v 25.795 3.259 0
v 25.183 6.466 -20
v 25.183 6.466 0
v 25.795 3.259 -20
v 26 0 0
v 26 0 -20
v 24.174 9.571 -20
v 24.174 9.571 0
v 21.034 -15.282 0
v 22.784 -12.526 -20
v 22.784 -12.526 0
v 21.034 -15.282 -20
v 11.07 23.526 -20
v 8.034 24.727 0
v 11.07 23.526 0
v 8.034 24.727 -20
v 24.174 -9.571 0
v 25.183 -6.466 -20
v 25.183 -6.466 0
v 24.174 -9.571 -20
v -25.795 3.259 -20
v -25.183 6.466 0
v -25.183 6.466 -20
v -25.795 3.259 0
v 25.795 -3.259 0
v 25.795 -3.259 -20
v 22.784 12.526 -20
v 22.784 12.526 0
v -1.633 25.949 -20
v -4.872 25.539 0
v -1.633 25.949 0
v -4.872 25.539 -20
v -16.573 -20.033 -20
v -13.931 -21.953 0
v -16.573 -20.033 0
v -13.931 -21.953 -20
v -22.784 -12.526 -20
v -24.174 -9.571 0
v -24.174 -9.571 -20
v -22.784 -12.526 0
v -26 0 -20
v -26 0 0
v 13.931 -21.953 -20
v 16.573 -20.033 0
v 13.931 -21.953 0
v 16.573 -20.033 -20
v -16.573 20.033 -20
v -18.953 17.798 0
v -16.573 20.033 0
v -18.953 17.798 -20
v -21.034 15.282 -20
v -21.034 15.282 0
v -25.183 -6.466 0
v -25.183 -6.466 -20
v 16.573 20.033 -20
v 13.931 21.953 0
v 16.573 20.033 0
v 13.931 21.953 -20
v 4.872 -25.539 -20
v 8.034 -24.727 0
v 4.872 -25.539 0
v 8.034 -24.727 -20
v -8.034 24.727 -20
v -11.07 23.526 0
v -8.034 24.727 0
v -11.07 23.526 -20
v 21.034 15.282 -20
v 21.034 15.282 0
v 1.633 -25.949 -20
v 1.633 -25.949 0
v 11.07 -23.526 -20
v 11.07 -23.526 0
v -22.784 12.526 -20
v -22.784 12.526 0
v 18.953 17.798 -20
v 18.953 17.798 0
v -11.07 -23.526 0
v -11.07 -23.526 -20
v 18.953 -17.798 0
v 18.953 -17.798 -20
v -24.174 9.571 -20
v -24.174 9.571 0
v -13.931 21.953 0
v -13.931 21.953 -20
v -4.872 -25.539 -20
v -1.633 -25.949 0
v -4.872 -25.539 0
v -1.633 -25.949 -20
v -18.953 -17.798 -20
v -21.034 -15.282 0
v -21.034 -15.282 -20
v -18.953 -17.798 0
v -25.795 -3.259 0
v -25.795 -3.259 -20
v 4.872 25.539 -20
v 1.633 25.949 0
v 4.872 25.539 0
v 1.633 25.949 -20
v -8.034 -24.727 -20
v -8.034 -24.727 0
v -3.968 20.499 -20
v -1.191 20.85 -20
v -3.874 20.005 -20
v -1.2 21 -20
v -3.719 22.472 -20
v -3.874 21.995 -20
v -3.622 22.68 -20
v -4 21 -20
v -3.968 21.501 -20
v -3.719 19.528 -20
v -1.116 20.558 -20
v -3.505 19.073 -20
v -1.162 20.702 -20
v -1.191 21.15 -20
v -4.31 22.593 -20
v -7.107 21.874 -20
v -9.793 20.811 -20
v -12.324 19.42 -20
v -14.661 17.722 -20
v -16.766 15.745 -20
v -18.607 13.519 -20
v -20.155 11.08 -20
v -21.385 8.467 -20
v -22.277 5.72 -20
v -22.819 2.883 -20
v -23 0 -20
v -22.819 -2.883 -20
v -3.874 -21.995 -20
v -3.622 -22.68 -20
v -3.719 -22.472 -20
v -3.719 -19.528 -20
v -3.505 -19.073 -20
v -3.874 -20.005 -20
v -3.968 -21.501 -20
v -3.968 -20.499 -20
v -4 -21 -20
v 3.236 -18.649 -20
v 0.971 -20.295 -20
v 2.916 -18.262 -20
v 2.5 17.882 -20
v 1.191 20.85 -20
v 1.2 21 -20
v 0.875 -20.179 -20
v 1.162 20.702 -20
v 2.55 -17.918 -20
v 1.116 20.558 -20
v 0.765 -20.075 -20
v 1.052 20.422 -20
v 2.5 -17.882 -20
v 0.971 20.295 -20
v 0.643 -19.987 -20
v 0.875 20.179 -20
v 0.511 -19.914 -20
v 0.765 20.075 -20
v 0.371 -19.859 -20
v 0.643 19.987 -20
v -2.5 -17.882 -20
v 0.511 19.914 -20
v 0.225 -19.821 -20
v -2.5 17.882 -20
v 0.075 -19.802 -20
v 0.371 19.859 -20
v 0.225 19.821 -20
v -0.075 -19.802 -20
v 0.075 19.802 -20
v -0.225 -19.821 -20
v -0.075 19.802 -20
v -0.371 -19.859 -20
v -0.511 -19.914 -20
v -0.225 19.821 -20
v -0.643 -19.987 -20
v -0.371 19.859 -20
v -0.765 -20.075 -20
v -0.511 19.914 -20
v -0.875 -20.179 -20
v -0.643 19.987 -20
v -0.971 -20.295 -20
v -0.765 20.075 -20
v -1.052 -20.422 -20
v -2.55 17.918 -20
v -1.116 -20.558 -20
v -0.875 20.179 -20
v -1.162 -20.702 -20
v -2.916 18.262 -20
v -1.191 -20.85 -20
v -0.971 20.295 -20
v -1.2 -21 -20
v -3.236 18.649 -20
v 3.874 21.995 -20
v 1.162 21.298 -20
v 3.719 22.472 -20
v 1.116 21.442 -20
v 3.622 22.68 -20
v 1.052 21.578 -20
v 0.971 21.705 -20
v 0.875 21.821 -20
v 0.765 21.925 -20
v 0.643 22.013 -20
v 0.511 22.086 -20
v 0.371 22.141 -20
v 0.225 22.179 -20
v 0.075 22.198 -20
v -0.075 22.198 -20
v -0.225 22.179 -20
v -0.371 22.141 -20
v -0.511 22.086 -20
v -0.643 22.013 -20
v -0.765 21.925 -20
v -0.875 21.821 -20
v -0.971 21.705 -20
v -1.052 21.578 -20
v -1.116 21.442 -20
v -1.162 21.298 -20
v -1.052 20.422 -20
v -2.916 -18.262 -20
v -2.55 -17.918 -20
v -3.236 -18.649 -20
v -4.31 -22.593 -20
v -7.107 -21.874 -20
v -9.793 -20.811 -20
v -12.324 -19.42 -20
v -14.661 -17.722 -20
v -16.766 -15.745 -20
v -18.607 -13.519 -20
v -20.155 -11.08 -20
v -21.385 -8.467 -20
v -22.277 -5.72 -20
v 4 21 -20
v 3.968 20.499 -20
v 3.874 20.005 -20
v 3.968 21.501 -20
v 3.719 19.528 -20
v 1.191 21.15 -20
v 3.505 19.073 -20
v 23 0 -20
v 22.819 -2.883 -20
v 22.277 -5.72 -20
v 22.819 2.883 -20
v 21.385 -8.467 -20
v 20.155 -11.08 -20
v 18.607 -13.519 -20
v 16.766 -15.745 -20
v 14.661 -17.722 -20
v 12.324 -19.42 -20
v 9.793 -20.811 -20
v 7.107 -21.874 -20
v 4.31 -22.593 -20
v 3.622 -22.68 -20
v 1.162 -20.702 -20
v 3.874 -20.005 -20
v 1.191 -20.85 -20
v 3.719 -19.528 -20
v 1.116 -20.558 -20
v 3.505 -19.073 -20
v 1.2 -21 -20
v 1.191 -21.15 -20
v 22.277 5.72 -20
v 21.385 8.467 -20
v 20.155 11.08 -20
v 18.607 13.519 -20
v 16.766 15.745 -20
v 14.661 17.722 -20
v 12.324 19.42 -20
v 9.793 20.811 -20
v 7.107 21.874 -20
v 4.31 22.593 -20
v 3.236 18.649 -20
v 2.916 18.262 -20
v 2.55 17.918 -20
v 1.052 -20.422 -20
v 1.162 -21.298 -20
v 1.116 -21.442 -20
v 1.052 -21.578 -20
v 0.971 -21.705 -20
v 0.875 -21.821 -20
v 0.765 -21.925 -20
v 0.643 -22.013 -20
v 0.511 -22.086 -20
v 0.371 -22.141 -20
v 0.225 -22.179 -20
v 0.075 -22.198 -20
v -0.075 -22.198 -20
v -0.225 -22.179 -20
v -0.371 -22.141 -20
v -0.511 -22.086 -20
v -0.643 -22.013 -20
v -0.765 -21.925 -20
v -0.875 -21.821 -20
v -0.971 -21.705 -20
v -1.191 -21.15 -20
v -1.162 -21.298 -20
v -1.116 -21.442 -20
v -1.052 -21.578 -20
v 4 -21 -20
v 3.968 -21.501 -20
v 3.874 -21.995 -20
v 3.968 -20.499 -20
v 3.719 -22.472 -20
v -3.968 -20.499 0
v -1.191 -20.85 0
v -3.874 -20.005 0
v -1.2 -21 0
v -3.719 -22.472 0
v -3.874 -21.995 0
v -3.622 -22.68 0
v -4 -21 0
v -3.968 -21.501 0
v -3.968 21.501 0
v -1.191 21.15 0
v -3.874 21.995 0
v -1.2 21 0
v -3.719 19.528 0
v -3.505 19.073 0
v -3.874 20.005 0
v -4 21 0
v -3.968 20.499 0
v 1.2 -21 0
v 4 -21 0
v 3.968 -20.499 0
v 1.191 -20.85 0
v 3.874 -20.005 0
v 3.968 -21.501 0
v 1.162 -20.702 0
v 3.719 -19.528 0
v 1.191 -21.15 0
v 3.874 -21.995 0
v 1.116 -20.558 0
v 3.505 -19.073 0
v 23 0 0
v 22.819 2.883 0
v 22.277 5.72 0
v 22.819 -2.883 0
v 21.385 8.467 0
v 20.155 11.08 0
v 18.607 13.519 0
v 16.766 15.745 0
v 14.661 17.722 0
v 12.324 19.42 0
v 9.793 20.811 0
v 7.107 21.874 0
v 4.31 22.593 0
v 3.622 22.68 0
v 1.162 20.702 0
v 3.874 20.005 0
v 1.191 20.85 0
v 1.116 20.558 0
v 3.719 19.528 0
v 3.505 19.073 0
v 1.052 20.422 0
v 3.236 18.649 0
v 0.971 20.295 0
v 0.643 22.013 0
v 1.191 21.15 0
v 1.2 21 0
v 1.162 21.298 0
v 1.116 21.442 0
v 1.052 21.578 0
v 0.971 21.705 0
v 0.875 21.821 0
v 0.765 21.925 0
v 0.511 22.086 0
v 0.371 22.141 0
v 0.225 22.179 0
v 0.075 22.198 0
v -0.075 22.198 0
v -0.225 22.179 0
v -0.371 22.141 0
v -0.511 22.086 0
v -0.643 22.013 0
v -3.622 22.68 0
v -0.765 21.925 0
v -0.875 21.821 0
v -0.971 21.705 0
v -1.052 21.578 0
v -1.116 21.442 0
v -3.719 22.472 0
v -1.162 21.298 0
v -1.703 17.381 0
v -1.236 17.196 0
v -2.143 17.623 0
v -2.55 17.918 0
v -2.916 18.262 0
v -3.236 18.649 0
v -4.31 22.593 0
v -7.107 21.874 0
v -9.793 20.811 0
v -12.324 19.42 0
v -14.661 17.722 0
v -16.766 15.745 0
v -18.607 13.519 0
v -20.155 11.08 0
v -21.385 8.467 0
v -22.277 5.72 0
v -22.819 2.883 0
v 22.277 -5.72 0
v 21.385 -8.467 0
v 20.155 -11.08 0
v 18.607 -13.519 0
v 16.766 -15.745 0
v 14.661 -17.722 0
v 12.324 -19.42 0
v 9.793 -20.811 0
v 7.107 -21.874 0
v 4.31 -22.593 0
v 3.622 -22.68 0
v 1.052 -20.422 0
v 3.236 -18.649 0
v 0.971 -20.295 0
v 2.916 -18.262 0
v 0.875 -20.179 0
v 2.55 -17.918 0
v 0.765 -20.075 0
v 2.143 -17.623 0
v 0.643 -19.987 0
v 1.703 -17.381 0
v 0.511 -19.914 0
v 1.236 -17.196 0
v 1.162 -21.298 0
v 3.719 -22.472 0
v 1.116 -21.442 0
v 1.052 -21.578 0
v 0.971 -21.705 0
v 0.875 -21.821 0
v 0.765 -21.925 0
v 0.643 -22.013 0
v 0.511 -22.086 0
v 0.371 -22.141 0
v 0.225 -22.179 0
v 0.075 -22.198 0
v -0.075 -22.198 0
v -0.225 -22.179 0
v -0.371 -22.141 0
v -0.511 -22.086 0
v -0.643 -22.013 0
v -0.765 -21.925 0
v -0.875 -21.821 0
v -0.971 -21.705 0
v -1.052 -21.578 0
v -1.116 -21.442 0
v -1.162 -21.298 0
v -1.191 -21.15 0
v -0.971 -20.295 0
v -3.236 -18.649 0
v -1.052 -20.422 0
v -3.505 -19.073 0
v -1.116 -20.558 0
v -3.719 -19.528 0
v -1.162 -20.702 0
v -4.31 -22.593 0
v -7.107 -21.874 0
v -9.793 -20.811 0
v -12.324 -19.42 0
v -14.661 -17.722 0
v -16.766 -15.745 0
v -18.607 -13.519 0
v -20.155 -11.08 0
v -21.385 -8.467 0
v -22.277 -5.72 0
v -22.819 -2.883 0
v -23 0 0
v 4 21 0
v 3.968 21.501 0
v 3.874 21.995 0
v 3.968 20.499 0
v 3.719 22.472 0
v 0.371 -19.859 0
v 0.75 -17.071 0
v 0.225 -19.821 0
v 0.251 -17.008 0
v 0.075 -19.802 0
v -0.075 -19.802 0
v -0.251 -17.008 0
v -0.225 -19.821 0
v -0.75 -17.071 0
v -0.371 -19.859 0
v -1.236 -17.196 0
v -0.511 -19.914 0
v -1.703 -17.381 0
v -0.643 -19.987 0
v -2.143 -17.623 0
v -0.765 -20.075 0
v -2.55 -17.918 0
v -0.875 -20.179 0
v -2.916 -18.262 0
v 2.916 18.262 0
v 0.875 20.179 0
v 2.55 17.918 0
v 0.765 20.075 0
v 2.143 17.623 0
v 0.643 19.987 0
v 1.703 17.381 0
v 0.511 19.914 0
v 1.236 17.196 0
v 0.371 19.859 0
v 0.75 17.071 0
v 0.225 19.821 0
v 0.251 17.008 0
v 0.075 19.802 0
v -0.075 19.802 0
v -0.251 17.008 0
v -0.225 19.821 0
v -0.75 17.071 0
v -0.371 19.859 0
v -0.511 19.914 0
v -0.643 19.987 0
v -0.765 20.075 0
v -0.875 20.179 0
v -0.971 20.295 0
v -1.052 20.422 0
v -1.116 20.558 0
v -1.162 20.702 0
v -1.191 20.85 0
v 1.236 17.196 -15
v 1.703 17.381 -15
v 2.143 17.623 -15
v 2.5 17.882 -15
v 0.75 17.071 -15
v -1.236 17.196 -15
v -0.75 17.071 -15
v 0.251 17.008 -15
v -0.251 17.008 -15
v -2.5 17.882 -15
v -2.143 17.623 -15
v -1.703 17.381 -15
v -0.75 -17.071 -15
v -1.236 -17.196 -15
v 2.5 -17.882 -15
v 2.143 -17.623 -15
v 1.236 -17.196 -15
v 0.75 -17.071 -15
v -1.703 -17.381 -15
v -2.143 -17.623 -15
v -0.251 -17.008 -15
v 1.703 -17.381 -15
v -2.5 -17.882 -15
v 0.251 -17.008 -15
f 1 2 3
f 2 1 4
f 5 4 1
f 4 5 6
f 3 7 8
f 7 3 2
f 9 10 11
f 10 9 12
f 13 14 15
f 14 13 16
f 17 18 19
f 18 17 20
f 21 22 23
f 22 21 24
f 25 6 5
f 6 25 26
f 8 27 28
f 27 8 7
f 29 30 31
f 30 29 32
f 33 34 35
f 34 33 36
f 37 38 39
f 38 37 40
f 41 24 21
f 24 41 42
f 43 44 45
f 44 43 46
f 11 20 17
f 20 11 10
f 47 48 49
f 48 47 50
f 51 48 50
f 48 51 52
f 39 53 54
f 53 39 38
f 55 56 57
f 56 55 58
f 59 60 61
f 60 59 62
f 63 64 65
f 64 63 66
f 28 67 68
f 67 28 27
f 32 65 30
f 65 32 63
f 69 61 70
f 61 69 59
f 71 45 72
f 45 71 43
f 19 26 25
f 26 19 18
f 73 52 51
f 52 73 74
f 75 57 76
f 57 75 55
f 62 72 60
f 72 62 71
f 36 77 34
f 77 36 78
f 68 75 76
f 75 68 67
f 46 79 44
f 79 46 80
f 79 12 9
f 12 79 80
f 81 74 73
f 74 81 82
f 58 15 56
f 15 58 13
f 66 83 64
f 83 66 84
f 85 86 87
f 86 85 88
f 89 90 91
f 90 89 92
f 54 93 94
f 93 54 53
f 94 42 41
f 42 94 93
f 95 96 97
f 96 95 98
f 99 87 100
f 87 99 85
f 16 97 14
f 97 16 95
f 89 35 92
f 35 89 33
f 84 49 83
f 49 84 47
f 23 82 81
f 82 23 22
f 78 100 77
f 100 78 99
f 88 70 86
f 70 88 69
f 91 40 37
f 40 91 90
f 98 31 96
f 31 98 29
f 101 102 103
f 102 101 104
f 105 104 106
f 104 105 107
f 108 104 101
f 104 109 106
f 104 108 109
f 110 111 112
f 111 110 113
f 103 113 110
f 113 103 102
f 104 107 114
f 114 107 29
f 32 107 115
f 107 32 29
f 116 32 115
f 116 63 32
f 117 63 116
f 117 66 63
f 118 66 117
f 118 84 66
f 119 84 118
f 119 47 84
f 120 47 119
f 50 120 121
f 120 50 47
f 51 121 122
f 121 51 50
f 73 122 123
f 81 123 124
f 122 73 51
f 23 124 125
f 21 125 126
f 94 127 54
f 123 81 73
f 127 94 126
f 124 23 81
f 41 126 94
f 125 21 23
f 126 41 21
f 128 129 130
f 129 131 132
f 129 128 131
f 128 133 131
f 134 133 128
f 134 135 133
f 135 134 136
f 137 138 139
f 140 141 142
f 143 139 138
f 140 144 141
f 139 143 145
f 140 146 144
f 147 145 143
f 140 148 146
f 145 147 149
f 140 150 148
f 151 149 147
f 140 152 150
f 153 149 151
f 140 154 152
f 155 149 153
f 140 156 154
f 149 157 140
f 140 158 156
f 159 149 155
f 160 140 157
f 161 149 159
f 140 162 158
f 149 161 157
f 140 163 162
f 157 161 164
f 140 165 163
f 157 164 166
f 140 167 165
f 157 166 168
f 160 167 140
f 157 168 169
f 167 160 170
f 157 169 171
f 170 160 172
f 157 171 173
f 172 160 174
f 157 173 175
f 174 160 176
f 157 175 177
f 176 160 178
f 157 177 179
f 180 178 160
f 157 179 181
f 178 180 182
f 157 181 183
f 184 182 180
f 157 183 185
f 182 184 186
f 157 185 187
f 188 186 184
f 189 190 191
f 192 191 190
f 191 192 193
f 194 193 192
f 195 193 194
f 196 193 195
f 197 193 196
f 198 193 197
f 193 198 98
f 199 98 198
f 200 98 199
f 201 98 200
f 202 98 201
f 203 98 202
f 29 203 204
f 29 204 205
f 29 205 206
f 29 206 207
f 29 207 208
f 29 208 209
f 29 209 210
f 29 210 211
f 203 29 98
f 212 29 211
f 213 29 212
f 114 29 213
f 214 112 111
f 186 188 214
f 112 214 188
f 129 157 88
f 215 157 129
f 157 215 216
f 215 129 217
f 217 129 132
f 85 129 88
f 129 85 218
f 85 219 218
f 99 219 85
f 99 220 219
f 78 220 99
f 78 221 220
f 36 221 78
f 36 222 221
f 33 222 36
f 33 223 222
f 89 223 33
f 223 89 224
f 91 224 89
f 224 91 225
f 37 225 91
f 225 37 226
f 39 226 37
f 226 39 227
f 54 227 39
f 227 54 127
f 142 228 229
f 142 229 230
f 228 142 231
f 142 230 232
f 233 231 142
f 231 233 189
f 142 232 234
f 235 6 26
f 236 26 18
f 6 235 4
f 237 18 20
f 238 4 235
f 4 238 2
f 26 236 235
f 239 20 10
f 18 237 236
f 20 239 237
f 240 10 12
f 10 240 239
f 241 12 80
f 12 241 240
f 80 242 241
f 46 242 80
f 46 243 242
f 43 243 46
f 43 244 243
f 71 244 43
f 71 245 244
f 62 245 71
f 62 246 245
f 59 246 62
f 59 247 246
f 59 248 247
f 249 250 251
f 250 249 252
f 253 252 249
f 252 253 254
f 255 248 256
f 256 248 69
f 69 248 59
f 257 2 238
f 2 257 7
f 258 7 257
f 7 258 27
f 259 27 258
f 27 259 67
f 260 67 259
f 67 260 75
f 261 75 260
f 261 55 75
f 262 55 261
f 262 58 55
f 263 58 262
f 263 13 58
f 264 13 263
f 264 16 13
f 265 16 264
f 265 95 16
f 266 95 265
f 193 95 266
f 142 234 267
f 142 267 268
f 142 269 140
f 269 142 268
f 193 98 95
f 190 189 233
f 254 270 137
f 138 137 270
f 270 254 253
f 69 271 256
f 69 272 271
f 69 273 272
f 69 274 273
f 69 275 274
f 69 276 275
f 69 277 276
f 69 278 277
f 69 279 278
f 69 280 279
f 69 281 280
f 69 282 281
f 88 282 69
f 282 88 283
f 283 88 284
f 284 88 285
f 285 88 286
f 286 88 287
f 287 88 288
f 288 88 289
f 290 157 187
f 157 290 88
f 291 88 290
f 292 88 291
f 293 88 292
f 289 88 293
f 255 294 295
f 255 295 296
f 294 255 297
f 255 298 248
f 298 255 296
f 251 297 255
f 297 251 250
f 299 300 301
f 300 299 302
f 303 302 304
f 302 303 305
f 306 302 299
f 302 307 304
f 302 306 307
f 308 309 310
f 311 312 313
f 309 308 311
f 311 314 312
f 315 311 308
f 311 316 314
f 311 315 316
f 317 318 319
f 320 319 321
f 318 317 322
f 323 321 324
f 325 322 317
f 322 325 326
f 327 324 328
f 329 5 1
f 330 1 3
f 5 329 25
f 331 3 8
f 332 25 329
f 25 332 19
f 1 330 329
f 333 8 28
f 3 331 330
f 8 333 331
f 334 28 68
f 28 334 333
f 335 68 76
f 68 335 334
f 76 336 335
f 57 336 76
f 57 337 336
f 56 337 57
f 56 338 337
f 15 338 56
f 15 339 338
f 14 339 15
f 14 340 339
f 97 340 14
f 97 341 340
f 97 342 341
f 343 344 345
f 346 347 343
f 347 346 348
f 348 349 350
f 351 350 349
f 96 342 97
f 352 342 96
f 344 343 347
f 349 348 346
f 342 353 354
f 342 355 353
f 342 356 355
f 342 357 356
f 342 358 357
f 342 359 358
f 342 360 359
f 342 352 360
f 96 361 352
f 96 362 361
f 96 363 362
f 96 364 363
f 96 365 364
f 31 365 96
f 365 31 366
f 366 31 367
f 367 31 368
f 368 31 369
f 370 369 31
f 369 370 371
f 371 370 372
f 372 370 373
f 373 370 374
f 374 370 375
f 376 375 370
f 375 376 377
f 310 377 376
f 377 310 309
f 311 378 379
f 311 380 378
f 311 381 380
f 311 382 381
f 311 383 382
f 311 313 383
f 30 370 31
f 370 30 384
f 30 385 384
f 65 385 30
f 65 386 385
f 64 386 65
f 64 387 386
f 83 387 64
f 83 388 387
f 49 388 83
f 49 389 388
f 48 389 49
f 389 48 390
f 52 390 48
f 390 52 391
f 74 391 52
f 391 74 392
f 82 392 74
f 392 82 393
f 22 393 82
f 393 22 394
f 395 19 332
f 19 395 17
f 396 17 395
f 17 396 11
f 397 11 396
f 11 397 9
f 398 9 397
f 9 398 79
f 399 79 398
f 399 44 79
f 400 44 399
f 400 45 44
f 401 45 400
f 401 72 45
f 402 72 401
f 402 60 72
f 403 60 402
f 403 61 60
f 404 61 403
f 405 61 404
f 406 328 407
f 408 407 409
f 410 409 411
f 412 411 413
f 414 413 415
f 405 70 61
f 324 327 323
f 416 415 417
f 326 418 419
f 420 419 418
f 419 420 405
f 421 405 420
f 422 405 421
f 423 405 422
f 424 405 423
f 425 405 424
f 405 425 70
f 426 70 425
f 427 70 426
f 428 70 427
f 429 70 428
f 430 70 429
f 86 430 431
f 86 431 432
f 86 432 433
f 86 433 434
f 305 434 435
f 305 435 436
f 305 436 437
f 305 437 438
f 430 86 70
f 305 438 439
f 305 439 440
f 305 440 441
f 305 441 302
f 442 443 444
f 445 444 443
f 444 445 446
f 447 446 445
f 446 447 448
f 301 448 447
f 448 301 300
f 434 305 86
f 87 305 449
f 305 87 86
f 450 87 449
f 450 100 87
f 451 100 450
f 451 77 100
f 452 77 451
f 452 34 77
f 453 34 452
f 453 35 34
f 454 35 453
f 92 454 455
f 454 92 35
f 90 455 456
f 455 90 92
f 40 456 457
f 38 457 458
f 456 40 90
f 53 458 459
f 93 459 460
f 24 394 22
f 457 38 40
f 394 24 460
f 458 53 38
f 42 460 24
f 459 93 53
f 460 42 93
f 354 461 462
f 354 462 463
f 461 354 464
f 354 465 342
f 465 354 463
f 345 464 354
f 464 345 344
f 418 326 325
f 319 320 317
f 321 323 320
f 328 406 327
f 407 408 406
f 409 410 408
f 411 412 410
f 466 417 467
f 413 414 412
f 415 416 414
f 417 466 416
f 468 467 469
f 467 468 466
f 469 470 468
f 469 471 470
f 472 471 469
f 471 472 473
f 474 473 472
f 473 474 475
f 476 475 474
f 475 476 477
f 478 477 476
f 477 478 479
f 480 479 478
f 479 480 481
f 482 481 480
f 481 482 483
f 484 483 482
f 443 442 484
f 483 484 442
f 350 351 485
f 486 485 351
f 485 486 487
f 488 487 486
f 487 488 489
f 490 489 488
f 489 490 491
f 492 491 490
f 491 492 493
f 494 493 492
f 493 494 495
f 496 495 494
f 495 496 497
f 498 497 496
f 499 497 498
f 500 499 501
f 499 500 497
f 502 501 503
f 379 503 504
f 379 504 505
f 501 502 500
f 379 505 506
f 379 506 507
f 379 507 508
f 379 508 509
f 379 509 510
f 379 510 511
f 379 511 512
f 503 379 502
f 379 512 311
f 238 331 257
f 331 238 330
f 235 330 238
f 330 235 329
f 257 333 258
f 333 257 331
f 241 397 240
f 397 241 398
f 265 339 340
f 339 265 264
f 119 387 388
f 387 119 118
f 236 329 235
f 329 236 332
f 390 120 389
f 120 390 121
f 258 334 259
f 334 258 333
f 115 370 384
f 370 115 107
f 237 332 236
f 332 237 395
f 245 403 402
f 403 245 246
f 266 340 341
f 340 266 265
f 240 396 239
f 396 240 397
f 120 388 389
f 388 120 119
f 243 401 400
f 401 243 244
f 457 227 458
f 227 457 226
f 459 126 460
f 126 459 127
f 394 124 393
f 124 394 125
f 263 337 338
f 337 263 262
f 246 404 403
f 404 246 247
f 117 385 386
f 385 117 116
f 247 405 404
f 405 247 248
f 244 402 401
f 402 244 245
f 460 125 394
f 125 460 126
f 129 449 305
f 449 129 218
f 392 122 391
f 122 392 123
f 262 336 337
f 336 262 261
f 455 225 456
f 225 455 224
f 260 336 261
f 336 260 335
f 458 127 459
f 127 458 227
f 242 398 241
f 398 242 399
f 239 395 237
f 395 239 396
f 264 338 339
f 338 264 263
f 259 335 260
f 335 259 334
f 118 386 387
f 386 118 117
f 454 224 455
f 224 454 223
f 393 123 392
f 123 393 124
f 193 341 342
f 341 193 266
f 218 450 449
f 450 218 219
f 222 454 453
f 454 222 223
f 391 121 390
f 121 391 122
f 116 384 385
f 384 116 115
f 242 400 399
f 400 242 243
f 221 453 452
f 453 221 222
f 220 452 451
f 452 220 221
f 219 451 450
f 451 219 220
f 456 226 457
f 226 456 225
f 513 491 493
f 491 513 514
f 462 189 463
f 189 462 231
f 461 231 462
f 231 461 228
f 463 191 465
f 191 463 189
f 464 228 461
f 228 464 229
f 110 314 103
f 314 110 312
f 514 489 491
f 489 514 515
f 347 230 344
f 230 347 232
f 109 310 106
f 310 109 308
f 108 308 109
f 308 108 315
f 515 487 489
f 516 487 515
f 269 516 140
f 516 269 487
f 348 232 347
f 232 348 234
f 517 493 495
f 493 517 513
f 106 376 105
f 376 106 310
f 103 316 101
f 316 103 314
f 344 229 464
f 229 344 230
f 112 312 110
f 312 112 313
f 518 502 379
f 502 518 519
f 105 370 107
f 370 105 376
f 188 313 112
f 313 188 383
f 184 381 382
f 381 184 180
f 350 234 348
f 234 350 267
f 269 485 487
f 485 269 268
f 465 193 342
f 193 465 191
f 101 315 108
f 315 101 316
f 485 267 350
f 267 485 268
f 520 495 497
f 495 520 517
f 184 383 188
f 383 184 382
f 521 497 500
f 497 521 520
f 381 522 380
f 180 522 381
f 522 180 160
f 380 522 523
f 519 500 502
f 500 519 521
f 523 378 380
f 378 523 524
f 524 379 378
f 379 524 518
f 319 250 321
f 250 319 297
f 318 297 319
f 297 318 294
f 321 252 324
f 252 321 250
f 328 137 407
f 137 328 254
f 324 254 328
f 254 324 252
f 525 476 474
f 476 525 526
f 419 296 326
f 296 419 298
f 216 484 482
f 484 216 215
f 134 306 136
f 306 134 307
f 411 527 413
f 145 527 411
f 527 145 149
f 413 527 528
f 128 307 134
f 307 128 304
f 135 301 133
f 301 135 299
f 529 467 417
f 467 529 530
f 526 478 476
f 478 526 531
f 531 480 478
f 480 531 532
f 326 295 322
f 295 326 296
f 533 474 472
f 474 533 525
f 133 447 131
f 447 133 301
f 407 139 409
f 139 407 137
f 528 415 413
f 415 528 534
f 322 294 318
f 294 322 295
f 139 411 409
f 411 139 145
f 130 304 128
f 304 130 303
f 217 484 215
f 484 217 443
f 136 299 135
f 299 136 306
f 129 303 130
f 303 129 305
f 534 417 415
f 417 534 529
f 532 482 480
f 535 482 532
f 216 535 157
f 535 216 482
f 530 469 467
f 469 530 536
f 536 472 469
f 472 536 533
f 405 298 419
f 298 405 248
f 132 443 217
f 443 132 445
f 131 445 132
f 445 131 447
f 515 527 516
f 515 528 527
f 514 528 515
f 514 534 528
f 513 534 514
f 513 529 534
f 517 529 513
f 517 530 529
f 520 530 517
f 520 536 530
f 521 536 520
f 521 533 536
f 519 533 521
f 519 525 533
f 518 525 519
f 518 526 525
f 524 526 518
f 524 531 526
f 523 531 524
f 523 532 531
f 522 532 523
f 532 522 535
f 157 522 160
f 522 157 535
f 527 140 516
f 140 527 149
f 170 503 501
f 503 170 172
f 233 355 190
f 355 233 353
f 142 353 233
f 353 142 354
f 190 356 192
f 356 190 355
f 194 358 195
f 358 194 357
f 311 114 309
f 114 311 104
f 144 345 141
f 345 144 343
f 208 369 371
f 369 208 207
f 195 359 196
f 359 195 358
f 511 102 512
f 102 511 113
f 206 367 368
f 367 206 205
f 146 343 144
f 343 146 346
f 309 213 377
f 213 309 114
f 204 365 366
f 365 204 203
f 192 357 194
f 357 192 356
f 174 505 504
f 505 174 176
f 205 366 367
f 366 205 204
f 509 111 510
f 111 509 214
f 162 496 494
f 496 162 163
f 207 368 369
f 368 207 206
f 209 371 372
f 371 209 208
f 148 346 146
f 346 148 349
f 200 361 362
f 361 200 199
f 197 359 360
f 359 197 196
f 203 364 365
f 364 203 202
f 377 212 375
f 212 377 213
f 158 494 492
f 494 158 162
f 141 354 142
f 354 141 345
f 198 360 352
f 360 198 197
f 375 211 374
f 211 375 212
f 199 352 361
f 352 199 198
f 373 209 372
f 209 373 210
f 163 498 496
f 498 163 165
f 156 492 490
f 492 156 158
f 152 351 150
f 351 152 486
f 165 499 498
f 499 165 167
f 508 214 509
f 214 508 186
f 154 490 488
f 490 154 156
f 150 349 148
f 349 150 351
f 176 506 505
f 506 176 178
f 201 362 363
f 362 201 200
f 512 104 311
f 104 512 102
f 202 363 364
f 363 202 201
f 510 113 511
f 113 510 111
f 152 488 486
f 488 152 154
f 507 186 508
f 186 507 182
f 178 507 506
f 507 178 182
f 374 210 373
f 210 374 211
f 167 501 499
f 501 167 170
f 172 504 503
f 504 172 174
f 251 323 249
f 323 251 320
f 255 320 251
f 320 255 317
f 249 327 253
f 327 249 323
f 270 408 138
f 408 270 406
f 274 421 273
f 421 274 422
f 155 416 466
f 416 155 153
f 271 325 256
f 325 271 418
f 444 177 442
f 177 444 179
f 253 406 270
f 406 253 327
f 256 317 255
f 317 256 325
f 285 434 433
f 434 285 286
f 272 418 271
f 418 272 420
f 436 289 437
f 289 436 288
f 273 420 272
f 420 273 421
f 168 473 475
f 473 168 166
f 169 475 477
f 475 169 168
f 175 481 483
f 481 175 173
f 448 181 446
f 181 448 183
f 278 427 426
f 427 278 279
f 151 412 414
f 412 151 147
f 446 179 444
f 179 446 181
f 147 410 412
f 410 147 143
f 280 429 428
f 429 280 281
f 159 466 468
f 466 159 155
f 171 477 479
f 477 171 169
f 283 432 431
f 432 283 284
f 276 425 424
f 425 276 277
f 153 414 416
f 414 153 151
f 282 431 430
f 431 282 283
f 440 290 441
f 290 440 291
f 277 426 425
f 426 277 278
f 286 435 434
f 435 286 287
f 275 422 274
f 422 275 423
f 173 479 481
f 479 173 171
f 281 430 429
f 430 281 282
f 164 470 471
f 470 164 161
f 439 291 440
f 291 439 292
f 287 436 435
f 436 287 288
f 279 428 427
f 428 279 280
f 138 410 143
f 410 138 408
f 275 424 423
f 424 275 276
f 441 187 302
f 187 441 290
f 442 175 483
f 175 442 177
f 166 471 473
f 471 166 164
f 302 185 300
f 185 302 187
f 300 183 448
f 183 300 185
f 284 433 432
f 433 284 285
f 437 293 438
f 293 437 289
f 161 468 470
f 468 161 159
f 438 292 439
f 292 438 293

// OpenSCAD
$fn = 50;

podRadius = 52/2;
podDepth = 20;
podHoleRadius = 23;
bezelRadius = podRadius + 5;
bezelHeight = 10;

// Adafruit 1.8" display with EYESPI
boardWidth = 57;
boardDepth = 36;
boardThickness = 6.5;
holeX = 25.5;
holeY = 15;
cornerRadius = 6;

boltPosition = 21;

/*
// zio.cc 1.5"
screenWidth = 30;
screenDepth = 34;
screenThickness = 1.5;

boardWidth = 45;
boardDepth = 36;
boardThickness = 1;
*/

module top()
{
    difference() {
        hull() {
            translate([0, 0, bezelHeight / 2])
                cylinder(h = bezelHeight, r = bezelRadius, center = true);
            
            translate([holeX, holeY, bezelHeight / 2])
                cylinder(h = bezelHeight, r = cornerRadius, center = true);
            translate([-holeX, holeY, bezelHeight / 2])
                cylinder(h = bezelHeight, r = cornerRadius, center = true);
            translate([holeX, -holeY, bezelHeight / 2])
                cylinder(h = bezelHeight, r = cornerRadius, center = true);
            translate([-holeX, -holeY, bezelHeight / 2])
                cylinder(h = bezelHeight, r = cornerRadius, center = true);
        }
        
        translate([holeX, holeY, 0])
            cylinder(h = bezelHeight, r = 1, center = true);
        translate([-holeX, holeY, 0])
            cylinder(h = bezelHeight, r = 1, center = true);
        translate([holeX, -holeY, 0])
            cylinder(h = bezelHeight, r = 1, center = true);
        translate([-holeX, -holeY, 0])
            cylinder(h = bezelHeight, r = 1, center = true);
        
        // cutout
        translate([0, 0, 2.9])
            cube([boardWidth, 25, 6], center = true);

        // bolts
        translate([0, boltPosition, 0])
            cylinder(h = 100, r = 1.7, center = true);
        translate([0, -boltPosition, 0])
            cylinder(h = 100, r = 1.7, center = true);

        // bolt heads
        translate([0, boltPosition, 9])
            cylinder(h = 3, r = 2.5, center = true);
        translate([0, -boltPosition, 9])
            cylinder(h = 3, r = 2.5, center = true);

        // ribbon connector
        translate([0, 15, 3])
            cube([15, 6, 3], center = true);
    }    

}

module display()
{
    translate([0, 0, boardThickness / 2])
        cube([boardWidth, boardDepth, boardThickness], center = true);
}

module base()
{
    difference() {
        union () {
            // bolt bosses
            translate([0, boltPosition, -podDepth / 2])
                cylinder(h = podDepth, r = 4, center = true);
            translate([0, -boltPosition, -podDepth / 2])
                cylinder(h = podDepth, r = 4, center = true);
            
            // crossbar
            translate([0, 0, -podDepth + 2.5])
                rotate([0, 0, 90])
                cube([podRadius * 2 - 2, 5, 5], center = true);
            
            // sleeve
            difference(){
                union () {
                    translate([0, 0, -podDepth / 2])
                        cylinder(h = podDepth, r = podRadius, center = true);
                }
                cylinder (h = 100, r = podHoleRadius, center = true);
            }
        }
        
        // bolt holes
        translate([0, boltPosition, 0])
            cylinder(h = 100, r = 1.2, center = true);
        translate([0, -boltPosition, 0])
            cylinder(h = 100, r = 1.2, center = true);
    }
}

// You'll probably want to comment out the top() or bottom() to print them separately.
difference() {
    union () {
        //top();
        base();
    }
    translate([0, 0, 4])
        display();
}
